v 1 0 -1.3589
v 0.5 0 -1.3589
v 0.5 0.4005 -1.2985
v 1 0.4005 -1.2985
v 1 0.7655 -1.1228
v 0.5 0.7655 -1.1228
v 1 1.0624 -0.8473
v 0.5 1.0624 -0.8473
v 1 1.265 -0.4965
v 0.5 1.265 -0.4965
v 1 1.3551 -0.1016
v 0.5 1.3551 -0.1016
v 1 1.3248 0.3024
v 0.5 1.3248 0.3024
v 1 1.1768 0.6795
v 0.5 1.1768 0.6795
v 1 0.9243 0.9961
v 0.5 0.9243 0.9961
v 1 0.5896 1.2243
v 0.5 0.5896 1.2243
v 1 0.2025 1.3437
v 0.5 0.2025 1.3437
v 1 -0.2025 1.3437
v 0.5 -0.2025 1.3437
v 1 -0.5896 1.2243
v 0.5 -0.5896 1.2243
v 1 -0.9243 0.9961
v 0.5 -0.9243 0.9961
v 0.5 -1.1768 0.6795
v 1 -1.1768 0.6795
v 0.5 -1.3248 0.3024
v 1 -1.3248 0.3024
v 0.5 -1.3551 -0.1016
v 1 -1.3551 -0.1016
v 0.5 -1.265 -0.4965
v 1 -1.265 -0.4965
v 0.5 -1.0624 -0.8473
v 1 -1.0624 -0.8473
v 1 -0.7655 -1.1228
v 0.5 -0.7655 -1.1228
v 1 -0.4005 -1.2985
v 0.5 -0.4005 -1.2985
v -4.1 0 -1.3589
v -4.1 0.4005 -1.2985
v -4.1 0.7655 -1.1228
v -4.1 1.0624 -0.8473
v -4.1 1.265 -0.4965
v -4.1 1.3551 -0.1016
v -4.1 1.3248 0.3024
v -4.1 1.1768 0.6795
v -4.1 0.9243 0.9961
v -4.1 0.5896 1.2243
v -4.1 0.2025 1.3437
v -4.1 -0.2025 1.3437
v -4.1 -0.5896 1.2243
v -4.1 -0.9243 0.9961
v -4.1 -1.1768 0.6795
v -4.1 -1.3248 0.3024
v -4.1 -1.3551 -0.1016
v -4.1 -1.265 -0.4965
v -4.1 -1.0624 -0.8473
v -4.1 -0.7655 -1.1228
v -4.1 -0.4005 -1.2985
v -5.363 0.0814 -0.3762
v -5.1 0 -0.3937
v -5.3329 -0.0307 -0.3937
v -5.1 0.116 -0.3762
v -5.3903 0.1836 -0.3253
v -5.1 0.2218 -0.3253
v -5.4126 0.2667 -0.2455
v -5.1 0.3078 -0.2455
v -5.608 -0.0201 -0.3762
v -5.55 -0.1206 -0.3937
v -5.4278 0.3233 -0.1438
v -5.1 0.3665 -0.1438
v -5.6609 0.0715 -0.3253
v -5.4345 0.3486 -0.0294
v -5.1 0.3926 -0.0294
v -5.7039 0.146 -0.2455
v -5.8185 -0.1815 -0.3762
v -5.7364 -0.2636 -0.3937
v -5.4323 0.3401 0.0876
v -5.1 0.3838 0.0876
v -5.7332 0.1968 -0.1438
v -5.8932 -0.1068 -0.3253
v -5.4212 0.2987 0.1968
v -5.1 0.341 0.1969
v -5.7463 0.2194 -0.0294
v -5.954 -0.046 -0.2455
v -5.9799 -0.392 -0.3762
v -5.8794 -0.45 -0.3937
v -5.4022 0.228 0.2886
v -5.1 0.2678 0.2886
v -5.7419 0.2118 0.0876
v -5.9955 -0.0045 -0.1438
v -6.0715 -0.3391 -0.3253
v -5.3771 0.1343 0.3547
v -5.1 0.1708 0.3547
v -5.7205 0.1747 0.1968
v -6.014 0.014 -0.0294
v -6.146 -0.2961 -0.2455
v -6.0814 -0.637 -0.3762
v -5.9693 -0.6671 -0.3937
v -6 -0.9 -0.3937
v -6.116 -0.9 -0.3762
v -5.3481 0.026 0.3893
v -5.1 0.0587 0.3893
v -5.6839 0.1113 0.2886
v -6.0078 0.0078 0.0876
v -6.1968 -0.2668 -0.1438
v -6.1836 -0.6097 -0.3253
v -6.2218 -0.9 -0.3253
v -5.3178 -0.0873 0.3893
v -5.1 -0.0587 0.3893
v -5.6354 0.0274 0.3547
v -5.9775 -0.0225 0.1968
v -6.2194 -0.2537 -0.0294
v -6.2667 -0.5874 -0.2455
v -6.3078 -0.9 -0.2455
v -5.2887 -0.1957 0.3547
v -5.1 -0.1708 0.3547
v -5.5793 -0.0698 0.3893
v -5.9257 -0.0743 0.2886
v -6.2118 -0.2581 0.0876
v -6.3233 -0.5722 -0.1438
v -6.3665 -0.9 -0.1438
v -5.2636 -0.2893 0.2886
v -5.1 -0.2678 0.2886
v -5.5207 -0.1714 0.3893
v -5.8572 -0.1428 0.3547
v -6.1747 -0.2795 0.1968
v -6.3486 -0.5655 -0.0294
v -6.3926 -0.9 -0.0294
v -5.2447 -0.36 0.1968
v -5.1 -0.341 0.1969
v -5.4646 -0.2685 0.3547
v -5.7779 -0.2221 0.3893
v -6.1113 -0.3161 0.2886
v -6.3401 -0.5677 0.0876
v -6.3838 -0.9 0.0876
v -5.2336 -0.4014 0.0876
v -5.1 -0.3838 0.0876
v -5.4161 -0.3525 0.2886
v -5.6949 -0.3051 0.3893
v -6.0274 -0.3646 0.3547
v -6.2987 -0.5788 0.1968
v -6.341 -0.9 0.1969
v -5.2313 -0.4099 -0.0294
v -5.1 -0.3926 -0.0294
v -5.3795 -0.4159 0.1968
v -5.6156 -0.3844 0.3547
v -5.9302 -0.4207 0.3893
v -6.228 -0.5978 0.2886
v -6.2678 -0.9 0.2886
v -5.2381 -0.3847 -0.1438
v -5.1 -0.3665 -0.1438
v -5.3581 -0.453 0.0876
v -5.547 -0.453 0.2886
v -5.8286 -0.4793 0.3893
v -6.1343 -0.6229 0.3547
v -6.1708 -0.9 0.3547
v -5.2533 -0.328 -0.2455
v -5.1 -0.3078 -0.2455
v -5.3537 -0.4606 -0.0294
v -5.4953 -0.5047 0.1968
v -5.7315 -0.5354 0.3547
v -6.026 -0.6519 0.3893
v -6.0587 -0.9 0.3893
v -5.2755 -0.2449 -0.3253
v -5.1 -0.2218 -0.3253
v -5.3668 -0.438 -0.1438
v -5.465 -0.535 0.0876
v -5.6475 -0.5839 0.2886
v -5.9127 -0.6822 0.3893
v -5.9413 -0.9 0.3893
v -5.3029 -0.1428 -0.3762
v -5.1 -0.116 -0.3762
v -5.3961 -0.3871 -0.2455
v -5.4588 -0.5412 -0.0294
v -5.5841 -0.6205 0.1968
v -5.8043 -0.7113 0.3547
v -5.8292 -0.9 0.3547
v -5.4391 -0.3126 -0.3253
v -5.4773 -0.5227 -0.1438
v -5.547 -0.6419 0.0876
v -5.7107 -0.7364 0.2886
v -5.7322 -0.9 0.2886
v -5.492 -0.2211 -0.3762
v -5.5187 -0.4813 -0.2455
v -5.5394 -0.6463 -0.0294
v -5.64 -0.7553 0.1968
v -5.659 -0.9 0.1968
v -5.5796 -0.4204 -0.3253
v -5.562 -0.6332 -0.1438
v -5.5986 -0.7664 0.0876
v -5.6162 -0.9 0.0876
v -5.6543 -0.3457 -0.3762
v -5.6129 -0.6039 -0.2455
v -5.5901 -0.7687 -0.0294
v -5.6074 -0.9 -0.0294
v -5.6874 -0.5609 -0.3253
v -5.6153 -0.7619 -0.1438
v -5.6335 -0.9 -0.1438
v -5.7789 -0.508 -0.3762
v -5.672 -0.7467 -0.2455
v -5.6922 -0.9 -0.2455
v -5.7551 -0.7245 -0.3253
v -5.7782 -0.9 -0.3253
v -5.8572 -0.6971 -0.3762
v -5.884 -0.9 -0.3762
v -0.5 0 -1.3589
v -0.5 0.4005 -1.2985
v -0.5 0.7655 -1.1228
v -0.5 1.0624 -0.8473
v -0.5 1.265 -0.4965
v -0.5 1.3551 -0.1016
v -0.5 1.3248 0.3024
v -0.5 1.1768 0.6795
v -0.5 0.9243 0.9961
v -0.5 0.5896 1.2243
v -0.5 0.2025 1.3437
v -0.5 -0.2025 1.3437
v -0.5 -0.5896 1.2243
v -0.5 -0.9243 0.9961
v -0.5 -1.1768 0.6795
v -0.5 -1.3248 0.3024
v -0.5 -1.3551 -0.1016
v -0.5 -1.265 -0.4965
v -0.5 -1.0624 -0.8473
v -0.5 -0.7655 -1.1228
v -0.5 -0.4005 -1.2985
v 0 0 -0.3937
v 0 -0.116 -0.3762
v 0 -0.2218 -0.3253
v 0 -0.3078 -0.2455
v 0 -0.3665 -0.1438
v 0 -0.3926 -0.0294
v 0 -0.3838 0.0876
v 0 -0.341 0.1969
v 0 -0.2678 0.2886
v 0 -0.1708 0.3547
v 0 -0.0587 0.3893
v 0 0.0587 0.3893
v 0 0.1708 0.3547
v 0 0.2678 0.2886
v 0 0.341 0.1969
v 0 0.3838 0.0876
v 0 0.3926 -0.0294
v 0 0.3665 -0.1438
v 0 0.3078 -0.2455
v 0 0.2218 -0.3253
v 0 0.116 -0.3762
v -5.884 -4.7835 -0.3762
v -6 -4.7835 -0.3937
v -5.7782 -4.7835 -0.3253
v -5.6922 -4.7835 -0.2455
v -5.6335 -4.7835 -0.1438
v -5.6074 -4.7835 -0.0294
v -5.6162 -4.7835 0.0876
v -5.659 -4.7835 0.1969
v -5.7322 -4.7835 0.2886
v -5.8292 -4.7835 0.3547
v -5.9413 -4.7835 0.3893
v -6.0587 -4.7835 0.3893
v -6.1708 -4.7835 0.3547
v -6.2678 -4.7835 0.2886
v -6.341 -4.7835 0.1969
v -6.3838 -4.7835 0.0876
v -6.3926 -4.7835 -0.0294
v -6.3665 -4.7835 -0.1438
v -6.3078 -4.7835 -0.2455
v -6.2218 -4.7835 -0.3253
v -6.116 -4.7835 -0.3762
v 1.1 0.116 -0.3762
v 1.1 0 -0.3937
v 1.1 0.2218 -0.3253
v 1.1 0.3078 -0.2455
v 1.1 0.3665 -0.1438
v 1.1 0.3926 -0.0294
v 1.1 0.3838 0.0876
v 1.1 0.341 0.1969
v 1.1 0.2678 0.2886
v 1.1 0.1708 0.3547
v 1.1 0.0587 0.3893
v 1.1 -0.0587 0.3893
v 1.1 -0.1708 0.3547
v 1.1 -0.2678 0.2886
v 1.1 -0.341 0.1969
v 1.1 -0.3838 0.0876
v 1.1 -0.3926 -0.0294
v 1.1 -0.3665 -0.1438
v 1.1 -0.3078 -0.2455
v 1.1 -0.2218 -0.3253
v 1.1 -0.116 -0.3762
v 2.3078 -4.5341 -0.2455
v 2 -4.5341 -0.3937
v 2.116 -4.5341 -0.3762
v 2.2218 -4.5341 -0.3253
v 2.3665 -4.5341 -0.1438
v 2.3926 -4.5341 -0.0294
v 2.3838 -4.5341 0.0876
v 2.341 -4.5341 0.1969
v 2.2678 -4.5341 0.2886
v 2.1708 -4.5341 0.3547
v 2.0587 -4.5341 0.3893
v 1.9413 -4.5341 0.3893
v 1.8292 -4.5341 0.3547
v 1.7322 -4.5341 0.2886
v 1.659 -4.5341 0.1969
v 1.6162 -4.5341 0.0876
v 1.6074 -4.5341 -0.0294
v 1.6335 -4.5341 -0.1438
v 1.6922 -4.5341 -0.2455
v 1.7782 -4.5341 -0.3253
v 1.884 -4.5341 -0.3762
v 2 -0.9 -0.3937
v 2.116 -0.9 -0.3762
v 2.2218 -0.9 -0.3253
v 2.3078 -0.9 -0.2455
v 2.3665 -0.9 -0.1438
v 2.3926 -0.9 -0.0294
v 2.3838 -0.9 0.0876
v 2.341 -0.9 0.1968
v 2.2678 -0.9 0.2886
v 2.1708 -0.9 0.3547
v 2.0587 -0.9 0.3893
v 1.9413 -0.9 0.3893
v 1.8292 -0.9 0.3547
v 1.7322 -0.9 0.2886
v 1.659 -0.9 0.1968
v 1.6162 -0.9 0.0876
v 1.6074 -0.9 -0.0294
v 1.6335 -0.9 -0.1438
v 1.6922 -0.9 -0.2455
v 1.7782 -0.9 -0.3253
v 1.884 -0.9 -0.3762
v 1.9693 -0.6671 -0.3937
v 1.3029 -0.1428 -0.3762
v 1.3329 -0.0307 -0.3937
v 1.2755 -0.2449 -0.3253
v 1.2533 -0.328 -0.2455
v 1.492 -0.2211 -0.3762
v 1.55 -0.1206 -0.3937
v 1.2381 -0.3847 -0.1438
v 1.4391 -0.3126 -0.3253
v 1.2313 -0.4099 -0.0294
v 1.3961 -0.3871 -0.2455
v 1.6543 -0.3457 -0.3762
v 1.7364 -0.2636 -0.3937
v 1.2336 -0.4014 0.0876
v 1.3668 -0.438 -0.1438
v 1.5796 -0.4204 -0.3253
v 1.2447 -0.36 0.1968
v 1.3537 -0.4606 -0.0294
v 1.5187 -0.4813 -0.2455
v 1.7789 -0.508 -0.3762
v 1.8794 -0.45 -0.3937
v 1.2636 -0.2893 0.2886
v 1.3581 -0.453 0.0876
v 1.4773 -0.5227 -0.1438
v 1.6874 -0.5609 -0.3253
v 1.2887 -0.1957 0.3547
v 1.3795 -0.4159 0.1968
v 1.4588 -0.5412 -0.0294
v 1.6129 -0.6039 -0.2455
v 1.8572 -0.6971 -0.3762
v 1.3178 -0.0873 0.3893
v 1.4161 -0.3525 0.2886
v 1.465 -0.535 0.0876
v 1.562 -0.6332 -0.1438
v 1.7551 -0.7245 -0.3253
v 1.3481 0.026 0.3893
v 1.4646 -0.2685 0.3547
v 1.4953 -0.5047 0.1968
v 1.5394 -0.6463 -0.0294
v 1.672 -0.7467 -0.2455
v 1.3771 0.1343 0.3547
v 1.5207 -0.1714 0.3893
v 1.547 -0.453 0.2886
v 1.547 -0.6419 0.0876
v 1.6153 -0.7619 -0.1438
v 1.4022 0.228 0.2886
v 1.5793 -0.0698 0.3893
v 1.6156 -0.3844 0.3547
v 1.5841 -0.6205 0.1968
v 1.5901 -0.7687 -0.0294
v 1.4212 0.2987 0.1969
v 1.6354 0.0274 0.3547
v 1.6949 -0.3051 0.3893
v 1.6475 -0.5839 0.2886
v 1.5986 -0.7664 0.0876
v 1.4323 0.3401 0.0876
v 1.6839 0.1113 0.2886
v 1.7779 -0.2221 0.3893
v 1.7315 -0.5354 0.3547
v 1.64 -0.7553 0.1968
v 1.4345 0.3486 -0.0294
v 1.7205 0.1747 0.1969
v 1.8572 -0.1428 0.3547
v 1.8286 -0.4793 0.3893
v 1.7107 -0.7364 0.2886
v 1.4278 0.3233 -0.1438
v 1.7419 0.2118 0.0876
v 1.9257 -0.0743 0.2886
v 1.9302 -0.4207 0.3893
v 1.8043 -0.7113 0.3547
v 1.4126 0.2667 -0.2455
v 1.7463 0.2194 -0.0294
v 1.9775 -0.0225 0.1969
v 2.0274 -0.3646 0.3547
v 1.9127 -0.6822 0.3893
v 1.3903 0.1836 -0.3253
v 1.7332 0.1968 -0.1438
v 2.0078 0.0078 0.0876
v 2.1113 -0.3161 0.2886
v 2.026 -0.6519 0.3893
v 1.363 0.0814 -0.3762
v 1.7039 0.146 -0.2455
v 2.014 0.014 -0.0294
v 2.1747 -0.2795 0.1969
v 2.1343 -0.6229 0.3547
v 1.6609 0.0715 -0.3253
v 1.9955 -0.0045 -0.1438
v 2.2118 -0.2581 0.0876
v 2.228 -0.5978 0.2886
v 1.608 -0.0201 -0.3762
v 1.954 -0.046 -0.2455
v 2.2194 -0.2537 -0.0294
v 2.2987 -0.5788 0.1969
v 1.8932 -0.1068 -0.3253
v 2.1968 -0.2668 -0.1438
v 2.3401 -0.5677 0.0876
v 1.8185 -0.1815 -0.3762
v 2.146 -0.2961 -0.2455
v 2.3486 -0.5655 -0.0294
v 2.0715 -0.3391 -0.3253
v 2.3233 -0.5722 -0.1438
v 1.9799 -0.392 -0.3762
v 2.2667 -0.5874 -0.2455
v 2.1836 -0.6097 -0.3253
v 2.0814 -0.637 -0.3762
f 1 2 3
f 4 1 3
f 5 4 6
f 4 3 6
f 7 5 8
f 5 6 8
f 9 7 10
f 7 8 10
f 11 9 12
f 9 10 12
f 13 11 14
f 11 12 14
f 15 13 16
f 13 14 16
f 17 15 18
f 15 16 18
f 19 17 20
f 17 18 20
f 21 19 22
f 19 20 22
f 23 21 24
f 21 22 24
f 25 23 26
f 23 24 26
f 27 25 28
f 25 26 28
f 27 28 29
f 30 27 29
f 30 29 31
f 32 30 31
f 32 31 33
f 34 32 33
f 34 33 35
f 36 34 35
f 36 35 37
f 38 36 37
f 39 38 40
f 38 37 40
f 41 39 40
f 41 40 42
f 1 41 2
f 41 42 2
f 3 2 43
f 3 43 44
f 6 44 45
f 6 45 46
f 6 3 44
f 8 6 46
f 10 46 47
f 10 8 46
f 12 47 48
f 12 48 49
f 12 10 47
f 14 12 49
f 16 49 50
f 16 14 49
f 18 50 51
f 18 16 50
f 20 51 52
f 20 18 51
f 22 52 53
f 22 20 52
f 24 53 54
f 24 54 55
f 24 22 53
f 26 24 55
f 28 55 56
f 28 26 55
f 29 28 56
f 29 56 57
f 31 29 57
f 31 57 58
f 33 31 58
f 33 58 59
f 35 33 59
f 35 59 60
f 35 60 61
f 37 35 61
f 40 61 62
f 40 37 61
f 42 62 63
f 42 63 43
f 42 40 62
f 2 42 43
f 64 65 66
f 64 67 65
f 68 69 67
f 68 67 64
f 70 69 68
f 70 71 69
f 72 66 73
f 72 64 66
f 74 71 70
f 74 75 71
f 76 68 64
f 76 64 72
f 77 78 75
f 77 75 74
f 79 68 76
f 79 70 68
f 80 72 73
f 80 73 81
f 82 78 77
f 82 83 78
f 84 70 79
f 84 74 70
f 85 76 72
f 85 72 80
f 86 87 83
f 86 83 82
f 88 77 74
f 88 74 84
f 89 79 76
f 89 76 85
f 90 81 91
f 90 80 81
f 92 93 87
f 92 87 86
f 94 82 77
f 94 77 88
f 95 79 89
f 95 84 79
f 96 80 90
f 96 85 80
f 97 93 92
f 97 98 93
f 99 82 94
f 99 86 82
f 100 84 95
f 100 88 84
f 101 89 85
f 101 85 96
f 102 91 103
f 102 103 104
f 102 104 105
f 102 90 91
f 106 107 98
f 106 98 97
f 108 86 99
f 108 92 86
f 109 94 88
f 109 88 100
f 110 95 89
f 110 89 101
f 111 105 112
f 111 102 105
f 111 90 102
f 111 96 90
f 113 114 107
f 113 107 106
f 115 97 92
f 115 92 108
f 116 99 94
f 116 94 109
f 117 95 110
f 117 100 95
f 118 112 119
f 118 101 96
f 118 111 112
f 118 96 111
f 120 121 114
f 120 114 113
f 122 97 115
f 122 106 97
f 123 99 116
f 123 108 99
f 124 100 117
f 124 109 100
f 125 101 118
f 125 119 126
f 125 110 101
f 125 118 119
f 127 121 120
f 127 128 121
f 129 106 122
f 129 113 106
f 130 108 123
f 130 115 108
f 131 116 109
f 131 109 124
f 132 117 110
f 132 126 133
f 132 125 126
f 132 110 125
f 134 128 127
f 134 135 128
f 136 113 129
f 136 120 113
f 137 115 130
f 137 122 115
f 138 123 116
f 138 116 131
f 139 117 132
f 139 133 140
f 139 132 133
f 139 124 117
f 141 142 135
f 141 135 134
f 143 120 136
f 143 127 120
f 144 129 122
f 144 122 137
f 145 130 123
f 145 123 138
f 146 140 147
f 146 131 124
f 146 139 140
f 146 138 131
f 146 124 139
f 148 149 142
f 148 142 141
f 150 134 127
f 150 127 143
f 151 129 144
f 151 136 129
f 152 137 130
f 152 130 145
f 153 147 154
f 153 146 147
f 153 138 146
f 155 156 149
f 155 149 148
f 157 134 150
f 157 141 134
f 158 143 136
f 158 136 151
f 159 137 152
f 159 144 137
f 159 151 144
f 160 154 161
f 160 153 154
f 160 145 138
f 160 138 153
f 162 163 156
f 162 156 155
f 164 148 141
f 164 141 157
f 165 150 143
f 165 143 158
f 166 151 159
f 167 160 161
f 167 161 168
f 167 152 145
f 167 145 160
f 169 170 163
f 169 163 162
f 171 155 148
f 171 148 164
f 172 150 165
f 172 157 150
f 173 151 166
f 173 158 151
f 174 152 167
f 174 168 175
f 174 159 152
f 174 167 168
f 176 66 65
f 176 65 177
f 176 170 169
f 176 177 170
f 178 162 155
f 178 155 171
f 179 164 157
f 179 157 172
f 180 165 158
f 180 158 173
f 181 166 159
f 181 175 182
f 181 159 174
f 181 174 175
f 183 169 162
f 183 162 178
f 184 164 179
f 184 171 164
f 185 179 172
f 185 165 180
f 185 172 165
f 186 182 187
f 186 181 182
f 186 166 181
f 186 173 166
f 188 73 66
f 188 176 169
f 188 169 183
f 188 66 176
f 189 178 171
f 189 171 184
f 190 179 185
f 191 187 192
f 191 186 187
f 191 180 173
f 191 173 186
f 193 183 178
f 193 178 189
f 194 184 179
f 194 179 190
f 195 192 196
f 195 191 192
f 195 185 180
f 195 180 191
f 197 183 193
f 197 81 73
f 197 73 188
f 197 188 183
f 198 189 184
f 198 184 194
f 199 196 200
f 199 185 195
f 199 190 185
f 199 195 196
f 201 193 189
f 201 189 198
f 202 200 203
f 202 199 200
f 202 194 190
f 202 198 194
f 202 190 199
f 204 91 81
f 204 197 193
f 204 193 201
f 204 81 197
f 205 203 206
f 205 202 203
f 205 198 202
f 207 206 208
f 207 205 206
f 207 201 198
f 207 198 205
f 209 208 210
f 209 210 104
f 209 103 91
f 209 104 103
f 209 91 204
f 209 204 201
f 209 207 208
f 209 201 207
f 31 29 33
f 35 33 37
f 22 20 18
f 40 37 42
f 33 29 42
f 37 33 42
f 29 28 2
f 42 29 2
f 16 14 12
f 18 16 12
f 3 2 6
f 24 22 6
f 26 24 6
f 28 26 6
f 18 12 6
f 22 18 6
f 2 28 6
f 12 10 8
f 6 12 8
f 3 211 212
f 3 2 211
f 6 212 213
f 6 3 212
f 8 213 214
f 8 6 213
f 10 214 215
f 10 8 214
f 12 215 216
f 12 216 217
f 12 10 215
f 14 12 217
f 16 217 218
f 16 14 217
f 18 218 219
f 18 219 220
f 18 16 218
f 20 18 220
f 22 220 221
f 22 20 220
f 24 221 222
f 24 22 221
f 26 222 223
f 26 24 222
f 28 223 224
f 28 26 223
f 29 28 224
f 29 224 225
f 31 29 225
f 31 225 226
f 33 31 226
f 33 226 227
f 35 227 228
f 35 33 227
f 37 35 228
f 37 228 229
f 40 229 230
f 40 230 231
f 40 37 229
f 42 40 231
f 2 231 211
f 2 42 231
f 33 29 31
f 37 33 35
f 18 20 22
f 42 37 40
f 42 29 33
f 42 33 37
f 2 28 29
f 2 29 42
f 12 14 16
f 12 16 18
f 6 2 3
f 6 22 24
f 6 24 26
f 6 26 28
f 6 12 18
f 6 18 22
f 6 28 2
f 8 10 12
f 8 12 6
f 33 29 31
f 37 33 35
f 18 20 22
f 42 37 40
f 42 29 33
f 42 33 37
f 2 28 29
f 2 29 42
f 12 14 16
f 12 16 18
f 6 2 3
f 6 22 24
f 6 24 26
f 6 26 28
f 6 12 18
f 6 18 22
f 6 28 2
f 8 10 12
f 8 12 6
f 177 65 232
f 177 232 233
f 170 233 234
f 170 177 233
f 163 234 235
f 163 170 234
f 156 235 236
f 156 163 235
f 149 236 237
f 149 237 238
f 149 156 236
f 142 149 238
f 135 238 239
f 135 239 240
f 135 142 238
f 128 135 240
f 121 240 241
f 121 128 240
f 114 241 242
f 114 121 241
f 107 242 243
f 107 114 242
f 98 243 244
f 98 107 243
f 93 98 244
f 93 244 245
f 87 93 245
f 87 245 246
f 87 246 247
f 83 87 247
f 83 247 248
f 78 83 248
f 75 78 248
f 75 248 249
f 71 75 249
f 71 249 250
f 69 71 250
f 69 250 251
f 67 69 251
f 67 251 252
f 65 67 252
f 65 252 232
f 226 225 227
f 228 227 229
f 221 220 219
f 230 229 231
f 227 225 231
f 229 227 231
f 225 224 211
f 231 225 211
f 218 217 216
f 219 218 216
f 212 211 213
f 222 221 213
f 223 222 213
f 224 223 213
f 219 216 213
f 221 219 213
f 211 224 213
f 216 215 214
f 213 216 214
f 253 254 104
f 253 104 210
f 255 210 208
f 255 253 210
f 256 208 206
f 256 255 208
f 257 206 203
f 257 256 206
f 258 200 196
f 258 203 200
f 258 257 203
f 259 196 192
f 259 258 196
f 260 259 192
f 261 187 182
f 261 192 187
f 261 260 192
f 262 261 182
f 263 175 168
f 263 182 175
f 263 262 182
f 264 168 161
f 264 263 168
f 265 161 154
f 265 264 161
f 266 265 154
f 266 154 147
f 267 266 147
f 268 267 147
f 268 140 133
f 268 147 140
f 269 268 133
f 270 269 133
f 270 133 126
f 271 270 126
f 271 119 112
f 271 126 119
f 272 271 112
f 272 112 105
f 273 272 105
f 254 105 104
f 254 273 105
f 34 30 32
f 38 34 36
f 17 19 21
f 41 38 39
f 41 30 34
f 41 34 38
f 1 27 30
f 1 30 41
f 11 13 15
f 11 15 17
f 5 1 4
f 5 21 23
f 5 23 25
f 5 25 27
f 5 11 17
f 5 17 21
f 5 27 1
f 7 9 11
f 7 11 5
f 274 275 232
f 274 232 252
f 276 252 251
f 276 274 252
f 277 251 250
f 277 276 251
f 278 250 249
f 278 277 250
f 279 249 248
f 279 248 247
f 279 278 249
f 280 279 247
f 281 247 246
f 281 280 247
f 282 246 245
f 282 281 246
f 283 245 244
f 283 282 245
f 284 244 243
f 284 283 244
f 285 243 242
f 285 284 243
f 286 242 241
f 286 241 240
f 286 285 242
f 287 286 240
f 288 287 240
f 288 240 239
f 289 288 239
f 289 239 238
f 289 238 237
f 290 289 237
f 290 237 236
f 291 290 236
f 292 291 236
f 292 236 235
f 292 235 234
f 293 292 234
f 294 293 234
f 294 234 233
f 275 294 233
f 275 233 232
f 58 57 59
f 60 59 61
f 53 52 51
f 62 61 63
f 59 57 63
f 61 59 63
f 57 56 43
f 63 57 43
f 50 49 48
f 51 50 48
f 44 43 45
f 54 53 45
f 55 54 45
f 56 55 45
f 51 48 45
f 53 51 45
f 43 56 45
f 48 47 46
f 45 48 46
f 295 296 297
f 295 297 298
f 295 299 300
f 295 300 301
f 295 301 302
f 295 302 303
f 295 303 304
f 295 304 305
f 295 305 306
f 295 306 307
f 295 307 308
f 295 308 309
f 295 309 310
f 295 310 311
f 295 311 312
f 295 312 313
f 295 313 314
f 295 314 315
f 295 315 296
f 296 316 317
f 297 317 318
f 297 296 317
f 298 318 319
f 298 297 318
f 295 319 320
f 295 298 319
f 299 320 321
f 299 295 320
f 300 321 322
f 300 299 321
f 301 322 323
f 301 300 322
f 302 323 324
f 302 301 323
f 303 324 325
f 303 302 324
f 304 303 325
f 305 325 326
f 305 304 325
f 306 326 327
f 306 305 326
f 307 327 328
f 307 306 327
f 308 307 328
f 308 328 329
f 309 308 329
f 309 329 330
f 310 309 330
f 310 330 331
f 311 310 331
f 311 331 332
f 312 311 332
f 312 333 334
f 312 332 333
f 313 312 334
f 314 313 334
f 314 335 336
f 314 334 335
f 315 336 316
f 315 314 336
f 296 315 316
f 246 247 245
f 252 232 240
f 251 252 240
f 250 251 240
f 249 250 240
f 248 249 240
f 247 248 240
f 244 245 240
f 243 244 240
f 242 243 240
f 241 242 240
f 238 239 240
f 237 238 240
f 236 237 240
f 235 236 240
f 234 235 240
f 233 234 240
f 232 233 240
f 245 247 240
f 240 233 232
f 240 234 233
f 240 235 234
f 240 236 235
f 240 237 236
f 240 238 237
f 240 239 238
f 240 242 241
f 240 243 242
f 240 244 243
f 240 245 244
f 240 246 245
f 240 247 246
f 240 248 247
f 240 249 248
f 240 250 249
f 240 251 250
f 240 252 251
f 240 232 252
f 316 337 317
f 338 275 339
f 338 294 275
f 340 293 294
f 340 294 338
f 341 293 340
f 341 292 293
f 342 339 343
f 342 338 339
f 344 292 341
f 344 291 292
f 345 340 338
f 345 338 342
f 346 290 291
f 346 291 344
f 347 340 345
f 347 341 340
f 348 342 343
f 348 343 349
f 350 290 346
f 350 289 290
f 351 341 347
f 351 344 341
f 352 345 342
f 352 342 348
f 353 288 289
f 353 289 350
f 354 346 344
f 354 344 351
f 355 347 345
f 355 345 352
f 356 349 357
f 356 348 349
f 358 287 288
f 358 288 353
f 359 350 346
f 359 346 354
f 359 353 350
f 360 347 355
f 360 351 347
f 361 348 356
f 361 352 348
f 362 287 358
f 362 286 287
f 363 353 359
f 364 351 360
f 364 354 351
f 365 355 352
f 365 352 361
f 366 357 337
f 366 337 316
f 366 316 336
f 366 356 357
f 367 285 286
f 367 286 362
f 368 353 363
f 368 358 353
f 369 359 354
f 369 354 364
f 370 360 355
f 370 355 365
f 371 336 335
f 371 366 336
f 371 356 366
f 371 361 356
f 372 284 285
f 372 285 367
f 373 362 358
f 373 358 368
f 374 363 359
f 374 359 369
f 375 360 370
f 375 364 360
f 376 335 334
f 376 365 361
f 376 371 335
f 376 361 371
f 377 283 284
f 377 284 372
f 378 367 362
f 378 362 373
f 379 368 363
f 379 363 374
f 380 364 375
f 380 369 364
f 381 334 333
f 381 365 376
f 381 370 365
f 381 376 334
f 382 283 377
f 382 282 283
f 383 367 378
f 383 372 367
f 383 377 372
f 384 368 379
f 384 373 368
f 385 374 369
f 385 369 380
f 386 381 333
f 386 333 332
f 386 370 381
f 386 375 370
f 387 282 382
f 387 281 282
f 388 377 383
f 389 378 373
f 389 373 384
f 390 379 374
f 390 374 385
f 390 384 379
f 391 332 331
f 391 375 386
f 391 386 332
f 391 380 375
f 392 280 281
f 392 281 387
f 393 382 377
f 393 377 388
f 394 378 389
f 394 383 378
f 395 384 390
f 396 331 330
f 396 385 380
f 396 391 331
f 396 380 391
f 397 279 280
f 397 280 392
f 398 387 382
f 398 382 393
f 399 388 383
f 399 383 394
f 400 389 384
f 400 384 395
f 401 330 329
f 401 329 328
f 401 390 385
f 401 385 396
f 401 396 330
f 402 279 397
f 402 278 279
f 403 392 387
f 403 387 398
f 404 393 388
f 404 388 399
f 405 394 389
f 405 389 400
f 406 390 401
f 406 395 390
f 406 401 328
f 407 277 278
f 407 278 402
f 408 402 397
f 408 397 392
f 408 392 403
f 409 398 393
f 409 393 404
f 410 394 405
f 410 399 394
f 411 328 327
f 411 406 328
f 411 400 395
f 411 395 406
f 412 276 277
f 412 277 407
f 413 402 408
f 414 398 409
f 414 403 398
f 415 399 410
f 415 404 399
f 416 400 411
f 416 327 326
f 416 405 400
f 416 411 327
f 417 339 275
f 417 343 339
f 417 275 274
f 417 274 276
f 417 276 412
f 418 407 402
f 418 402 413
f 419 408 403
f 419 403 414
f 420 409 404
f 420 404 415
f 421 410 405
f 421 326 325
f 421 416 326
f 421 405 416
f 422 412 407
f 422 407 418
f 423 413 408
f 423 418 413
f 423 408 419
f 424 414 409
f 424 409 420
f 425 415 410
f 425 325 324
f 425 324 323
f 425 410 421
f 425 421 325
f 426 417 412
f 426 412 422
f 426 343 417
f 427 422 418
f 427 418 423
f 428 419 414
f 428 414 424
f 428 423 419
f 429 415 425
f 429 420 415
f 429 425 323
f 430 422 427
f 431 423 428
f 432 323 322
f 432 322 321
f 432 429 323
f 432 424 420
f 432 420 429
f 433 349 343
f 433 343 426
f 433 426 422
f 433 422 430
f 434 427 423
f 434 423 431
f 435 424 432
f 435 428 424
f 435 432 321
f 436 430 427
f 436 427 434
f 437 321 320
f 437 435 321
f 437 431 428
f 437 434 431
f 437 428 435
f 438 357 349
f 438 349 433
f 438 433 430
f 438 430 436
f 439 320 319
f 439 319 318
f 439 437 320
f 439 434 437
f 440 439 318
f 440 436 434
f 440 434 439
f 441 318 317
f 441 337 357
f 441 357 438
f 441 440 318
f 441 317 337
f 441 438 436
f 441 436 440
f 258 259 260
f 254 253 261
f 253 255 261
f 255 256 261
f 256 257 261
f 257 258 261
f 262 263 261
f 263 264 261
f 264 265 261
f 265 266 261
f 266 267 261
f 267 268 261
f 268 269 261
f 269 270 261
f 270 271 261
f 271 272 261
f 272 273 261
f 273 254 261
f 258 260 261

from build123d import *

# Parameters (mm, degrees)
SALIENTE_EXTRUIR1_DEPTH      = 0.5
SALIENTE_EXTRUIR1_DEPTH_BACK = 0.5
CROQUIS2_R                   = 1.3589
SALIENTE_EXTRUIR2_START      = 0.5
CROQUIS3_R                   = 1.3589
SALIENTE_EXTRUIR2_DEPTH      = 0.5
SALIENTE_EXTRUIR3_START      = 0.5
CROQUIS4_R                   = 1.3589
SALIENTE_EXTRUIR3_DEPTH      = 4.6
CROQUIS5_R                   = 0.3937
CROQUIS8_R                   = 0.3937


with BuildPart() as part:
    # Croquis2 → Saliente-Extruir1 (new, two sides: drawn at the far end of the back side and taken through both)
    with BuildSketch(Plane(origin=(0, 0, 0), x_dir=(0, 0, -1), z_dir=(1, 0, 0)).offset(-SALIENTE_EXTRUIR1_DEPTH_BACK)):
        Circle(CROQUIS2_R)
    extrude(amount=SALIENTE_EXTRUIR1_DEPTH + SALIENTE_EXTRUIR1_DEPTH_BACK)


with BuildPart() as body_2:
    # Croquis3 → Saliente-Extruir2 (new body)
    with BuildSketch(Plane(origin=(0, 0, 0), x_dir=(0, 0, -1), z_dir=(1, 0, 0)).offset(SALIENTE_EXTRUIR2_START)):
        Circle(CROQUIS3_R)
    extrude(amount=SALIENTE_EXTRUIR2_DEPTH)


with BuildPart() as body_3:
    # Croquis4 → Saliente-Extruir3 (new body)
    with BuildSketch(Plane(origin=(0, 0, 0), x_dir=(0, 0, -1), z_dir=(1, 0, 0)).offset(SALIENTE_EXTRUIR3_START)):
        Circle(CROQUIS4_R)
    extrude(amount=-SALIENTE_EXTRUIR3_DEPTH)


with BuildPart() as body_4:
    # Barrer1: sweep along a path in Croquis7
    with BuildLine(Plane.XY) as barrer1_path:
        Line((0, 0), (1.1, 0))
        ThreePointArc((1.1, 0), (1.736396103, -0.263603897), (2, -0.9))
        Line((2, -0.9), (2, -4.534050434))
    # Croquis5 → Barrer1 (sweep)
    with BuildSketch(Plane(origin=(0, 0, 0), x_dir=(0, 0, -1), z_dir=(1, 0, 0))):
        Circle(CROQUIS5_R)
    sweep(path=barrer1_path.line)


with BuildPart() as body_5:
    # Barrer2: sweep along a path in Croquis9
    with BuildLine(Plane.XY) as barrer2_path:
        Line((0, 0), (-5.1, 0))
        ThreePointArc((-5.1, 0), (-5.736396103, -0.263603897), (-6, -0.9))
        Line((-6, -0.9), (-6, -4.783473142))
    # Croquis8 → Barrer2 (sweep)
    with BuildSketch(Plane(origin=(0, 0, 0), x_dir=(0, 0, -1), z_dir=(1, 0, 0))):
        Circle(CROQUIS8_R)
    sweep(path=barrer2_path.line)


solid = Compound([part.part, body_2.part, body_3.part, body_4.part, body_5.part])
